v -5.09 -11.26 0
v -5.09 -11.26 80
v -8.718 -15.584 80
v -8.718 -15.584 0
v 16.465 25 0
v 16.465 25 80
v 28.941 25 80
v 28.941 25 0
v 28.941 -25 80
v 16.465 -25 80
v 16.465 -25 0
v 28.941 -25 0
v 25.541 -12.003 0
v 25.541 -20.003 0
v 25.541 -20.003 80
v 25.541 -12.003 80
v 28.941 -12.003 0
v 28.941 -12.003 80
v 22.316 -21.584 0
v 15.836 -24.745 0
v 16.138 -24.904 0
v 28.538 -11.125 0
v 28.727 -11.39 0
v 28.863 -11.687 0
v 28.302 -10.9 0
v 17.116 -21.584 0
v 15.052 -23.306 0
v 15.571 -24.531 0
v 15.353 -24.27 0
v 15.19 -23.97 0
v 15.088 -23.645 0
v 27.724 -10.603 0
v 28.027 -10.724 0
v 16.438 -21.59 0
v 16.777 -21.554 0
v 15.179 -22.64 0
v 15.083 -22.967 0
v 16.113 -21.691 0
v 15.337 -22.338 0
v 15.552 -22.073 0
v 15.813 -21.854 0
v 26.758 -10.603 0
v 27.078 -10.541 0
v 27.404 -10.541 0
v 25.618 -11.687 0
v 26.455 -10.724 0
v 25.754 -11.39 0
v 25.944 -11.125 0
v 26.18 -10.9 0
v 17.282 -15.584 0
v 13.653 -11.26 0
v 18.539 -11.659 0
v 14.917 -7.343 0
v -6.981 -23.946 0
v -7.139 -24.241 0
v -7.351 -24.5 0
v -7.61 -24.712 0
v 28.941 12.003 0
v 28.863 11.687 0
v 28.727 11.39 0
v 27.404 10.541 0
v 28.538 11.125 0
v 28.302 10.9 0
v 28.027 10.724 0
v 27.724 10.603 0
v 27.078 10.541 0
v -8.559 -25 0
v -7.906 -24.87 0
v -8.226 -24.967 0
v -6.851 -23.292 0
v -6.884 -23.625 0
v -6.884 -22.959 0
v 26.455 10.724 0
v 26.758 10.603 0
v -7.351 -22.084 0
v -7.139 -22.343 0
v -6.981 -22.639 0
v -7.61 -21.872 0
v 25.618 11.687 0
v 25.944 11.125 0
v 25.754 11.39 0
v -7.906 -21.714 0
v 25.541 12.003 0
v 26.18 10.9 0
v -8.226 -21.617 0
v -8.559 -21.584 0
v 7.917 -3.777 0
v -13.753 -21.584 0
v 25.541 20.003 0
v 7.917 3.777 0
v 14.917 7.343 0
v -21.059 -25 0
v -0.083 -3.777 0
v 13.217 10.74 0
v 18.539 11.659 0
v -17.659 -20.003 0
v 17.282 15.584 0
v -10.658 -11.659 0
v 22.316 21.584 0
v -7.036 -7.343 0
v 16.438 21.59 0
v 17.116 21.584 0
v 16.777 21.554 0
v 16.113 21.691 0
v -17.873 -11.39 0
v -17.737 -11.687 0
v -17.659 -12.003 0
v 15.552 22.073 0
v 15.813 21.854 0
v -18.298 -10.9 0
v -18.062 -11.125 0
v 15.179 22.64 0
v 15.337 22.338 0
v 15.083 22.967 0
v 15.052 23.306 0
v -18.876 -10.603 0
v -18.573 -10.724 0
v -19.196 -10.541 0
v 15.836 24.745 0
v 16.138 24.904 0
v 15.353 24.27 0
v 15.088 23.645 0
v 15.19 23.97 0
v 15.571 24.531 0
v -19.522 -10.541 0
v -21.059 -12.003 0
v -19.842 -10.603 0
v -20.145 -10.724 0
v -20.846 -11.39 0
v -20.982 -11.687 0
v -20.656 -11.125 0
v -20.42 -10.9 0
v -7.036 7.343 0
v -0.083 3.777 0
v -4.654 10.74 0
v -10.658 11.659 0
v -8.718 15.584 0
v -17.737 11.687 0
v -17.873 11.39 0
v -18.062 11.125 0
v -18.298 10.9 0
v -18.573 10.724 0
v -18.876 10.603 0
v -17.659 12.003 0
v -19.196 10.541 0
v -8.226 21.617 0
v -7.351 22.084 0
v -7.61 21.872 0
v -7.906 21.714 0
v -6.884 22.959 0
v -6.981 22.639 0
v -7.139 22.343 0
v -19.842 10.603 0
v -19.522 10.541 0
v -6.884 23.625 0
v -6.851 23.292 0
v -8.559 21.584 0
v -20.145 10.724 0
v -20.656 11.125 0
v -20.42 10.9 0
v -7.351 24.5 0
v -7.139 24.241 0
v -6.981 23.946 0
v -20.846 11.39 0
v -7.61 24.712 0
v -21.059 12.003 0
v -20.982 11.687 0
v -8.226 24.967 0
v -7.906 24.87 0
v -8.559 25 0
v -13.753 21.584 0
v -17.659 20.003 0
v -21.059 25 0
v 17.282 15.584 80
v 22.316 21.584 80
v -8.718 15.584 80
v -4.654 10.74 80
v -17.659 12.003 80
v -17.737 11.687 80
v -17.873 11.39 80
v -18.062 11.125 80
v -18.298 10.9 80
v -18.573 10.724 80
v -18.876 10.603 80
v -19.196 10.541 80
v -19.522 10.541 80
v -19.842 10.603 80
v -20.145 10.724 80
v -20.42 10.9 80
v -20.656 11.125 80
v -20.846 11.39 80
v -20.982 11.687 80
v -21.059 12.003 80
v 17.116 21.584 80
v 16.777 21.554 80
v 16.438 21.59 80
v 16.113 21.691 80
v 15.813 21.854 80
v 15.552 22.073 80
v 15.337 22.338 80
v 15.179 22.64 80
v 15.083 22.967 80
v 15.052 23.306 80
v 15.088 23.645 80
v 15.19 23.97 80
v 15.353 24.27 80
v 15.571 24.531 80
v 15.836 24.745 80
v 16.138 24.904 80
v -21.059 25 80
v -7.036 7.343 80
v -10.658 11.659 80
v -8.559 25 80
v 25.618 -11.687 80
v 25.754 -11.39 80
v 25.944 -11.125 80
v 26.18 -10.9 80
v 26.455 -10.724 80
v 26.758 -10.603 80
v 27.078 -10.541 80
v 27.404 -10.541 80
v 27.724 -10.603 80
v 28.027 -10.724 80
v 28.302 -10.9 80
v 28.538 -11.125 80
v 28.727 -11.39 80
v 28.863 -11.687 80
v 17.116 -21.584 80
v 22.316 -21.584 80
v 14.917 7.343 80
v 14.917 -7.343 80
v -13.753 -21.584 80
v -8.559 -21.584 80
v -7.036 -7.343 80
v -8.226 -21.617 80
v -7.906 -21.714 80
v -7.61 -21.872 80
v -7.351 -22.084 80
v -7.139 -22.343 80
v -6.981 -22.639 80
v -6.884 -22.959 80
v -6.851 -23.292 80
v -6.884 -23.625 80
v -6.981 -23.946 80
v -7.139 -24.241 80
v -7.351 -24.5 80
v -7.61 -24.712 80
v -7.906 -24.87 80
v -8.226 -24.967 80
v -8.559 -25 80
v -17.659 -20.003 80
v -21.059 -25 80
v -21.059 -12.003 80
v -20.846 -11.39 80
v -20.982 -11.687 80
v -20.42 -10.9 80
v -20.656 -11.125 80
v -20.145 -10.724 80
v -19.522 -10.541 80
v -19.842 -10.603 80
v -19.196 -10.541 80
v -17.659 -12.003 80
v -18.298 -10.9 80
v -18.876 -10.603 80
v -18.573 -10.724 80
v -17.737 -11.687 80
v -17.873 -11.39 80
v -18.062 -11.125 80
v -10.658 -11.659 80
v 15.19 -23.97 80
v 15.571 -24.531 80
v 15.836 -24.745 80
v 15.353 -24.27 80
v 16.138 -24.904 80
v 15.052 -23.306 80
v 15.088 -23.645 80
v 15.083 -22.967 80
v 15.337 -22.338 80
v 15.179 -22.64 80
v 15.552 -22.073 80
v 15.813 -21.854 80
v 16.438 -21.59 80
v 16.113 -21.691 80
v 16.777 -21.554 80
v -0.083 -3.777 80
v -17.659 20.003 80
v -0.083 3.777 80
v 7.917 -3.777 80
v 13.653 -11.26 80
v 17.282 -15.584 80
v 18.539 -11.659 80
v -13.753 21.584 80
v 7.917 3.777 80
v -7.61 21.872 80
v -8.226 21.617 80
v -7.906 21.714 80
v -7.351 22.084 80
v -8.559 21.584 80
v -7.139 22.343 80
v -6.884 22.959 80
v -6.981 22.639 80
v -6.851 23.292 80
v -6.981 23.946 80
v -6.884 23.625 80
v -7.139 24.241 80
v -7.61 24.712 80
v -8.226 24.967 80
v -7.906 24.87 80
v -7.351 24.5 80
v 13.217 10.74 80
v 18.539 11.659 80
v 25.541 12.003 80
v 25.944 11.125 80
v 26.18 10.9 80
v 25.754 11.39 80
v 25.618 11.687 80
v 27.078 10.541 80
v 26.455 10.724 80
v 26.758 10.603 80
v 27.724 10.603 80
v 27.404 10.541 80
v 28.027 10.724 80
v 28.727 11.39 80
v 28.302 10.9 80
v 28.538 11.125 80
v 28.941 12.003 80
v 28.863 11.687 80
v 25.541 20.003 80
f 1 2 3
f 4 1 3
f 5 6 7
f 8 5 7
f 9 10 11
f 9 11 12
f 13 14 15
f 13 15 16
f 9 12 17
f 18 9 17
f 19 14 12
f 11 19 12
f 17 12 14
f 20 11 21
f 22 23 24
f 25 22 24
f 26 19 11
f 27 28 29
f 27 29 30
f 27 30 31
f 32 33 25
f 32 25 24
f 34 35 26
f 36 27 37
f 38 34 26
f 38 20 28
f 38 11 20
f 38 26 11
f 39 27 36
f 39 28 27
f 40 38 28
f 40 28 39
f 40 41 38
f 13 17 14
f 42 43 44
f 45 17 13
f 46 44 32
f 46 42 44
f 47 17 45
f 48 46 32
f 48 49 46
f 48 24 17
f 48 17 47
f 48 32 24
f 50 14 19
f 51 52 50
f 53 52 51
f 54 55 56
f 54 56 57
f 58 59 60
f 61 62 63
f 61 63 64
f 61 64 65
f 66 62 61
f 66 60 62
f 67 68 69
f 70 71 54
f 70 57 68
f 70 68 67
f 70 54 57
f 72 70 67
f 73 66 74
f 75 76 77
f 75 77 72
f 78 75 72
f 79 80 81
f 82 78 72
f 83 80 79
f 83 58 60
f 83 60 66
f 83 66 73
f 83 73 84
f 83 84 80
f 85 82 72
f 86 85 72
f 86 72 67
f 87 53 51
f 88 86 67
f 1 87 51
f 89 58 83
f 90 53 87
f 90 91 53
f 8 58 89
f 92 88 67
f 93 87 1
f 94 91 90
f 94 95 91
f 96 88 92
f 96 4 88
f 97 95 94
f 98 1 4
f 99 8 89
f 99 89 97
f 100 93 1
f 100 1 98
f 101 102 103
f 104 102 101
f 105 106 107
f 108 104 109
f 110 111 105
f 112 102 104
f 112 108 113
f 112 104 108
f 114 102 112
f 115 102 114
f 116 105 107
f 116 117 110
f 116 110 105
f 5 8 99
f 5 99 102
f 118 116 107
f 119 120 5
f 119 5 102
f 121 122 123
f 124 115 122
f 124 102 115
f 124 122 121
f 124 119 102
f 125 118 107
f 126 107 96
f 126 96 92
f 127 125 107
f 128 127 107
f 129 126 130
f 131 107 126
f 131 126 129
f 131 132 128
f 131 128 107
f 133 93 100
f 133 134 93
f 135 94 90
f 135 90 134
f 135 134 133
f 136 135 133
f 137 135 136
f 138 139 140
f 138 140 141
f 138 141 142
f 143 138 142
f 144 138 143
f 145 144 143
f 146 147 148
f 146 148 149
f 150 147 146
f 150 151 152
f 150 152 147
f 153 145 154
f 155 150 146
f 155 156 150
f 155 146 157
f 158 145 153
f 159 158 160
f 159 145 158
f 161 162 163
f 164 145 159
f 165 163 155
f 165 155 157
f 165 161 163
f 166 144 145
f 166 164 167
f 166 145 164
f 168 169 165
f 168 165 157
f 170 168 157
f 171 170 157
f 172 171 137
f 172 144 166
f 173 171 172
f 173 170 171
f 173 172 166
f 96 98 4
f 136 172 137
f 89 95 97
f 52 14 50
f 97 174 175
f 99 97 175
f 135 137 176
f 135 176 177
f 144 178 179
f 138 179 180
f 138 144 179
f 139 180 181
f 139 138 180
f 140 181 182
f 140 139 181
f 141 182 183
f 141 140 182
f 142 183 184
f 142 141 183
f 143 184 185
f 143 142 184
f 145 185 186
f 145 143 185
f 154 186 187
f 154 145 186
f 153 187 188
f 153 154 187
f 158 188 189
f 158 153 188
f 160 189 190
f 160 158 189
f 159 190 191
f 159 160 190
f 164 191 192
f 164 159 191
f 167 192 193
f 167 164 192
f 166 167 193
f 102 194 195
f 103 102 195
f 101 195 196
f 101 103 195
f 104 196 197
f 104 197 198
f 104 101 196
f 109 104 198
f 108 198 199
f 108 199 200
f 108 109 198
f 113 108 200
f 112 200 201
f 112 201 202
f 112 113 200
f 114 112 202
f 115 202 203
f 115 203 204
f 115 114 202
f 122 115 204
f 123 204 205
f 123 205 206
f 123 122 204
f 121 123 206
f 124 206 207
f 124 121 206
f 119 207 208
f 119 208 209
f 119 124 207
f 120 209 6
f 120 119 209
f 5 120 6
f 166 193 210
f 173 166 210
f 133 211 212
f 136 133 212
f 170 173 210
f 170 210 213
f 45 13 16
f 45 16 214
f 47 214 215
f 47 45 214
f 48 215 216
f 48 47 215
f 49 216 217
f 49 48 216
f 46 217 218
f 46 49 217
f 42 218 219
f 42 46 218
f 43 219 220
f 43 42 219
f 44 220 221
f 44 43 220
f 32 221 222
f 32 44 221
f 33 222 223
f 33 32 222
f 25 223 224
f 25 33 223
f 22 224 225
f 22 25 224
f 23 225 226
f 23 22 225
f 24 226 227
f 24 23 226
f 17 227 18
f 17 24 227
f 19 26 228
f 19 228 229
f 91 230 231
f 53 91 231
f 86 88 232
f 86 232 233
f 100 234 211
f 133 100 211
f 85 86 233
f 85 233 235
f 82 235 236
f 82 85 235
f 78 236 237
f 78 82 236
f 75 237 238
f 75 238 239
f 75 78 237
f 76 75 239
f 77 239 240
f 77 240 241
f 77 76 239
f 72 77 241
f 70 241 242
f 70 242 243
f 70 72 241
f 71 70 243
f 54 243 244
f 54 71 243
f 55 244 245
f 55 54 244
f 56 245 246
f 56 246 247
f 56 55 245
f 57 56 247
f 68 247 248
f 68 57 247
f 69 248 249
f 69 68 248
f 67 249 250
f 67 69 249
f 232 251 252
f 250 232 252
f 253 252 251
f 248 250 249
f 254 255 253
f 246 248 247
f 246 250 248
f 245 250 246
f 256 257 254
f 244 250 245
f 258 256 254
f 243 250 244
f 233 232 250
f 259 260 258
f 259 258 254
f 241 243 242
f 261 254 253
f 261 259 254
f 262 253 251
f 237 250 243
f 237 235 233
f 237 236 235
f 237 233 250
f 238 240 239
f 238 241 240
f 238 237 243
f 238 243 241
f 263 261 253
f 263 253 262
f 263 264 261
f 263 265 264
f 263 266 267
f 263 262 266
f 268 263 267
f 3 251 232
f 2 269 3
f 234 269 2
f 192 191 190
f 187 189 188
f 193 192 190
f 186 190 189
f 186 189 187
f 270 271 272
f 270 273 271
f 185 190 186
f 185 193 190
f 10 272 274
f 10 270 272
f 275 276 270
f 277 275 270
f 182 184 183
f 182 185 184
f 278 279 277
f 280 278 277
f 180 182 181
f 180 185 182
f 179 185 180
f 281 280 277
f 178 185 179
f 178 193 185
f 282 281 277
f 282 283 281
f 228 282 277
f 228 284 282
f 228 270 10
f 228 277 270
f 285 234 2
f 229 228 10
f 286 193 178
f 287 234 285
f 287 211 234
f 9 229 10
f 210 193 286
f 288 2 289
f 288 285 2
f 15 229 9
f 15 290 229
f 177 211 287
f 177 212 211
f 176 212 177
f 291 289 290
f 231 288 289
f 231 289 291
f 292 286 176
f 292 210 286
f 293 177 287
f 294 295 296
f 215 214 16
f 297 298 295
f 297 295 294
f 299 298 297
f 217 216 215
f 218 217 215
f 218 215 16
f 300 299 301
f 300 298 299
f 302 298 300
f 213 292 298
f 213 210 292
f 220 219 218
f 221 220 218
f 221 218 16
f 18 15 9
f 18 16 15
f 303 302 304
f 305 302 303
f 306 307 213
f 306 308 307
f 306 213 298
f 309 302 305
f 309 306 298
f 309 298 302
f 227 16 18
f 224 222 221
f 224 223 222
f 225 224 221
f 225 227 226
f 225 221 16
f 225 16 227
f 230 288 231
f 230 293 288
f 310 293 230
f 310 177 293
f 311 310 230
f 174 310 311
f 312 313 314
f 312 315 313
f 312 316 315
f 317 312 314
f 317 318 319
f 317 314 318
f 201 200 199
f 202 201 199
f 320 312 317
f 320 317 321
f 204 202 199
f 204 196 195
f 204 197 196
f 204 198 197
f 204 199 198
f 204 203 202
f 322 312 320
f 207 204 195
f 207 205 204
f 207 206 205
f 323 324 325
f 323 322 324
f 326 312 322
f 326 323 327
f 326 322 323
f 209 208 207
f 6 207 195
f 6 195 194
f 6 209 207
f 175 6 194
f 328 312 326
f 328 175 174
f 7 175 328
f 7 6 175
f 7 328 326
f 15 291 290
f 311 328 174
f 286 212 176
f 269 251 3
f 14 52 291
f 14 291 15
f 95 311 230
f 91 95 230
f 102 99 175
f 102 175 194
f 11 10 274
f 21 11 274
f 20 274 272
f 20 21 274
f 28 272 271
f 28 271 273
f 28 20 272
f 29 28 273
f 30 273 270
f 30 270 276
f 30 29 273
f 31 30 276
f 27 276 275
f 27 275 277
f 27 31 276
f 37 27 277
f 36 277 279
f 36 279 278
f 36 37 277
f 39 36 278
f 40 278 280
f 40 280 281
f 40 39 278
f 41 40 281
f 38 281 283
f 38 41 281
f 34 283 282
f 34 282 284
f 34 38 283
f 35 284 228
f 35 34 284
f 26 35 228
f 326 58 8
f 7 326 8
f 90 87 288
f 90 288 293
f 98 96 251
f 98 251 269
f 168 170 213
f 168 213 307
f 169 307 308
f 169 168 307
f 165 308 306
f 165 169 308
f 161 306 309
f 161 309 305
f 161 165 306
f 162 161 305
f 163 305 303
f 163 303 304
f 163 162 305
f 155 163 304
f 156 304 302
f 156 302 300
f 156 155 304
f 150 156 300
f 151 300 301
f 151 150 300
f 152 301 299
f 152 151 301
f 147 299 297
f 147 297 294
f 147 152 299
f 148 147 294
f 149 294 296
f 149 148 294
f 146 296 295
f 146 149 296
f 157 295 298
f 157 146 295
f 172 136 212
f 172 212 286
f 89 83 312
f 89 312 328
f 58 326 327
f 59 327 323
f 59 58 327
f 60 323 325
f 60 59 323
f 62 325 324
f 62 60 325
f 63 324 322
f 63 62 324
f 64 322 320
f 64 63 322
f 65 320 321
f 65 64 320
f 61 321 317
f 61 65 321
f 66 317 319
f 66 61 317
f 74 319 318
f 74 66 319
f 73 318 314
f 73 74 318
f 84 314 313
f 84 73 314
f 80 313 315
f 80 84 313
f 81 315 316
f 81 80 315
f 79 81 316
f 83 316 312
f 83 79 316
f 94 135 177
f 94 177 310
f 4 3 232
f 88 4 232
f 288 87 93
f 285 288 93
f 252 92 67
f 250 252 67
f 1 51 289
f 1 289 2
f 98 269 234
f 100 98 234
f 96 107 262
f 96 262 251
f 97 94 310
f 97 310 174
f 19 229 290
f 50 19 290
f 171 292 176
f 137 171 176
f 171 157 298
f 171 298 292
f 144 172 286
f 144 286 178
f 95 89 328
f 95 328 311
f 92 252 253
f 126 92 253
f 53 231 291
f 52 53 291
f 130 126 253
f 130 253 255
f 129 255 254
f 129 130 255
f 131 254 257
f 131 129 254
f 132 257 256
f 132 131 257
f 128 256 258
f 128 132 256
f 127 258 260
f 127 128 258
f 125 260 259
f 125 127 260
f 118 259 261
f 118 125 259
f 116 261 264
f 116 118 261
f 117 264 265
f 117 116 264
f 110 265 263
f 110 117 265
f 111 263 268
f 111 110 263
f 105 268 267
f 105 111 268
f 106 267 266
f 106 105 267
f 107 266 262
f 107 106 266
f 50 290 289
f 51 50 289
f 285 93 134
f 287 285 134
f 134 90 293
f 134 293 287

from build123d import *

# Parameters (mm, degrees)
SKETCH1_W           = 50
SKETCH1_H           = 50
BOSS_EXTRUDE1_DEPTH = 80
SKETCH2_W           = 18
SKETCH2_H           = 18
CUT_EXTRUDE2_DEPTH  = 287
SKETCH3_OUTSIDE_W   = 73.354
SKETCH3_OUTSIDE_H   = 73.354
CUT_EXTRUDE5_DEPTH  = 287
SKETCH4_W           = 18
SKETCH4_H           = 18
BOSS_EXTRUDE2_DEPTH = 80
SKETCH5_W           = 8
SKETCH5_H           = 7.553245746
CUT_EXTRUDE6_DEPTH  = 250


with BuildPart() as part:
    # Sketch1 → Boss-Extrude1 (new body)
    with BuildSketch(Plane.XY):
        with Locations((3.9408867, 0)):
            Rectangle(SKETCH1_W, SKETCH1_H)
    extrude(amount=BOSS_EXTRUDE1_DEPTH)

    # Sketch2 → Cut-Extrude2 (cut)
    with BuildSketch(Plane(origin=(0, 0, 0), x_dir=(-1, 0, 0), z_dir=(0, 0, -1))):
        with Locations((-3.9408867, 0)):
            Rectangle(SKETCH2_W, SKETCH2_H)
    extrude(amount=-CUT_EXTRUDE2_DEPTH, mode=Mode.SUBTRACT)

    # Sketch3 outside → Cut-Extrude5 (cut)
    with BuildSketch(Plane(origin=(0, 0, 0), x_dir=(-1, 0, 0), z_dir=(0, 0, -1))):
        with Locations((-3.941, 0)):
            Rectangle(SKETCH3_OUTSIDE_W, SKETCH3_OUTSIDE_H)
        with BuildLine():
            Line((-22.316271067, 21.584230763), (-17.116271067, 21.584230763))
            ThreePointArc((-17.116271067, 21.584230763), (-15.082817857, 22.96654679), (-16.465133883, 25))
            Line((-16.465133883, 25), (-28.9408867, 25))
            Line((-28.9408867, 25), (-28.9408867, 12.5))
            ThreePointArc((-28.9408867, 12.5), (-27.489165976, 10.551720724), (-25.5408867, 12.003441448))
            Line((-25.5408867, 12.003441448), (-25.5408867, 20.003441448))
            Line((-25.5408867, 20.003441448), (-18.539469589, 11.659477453))
            Line((-18.539469589, 11.659477453), (-14.917465737, 7.34294135))
            Line((-14.917465737, 7.34294135), (-14.917465737, -7.34294135))
            Line((-14.917465737, -7.34294135), (-18.539469589, -11.659477453))
            Line((-18.539469589, -11.659477453), (-25.5408867, -20.003441448))
            Line((-25.5408867, -20.003441448), (-25.5408867, -12.003441448))
            ThreePointArc((-25.5408867, -12.003441448), (-27.489165976, -10.551720724), (-28.9408867, -12.5))
            Line((-28.9408867, -12.5), (-28.9408867, -25))
            Line((-28.9408867, -25), (-16.465133883, -25))
            ThreePointArc((-16.465133883, -25), (-15.082817857, -22.96654679), (-17.116271067, -21.584230763))
            Line((-17.116271067, -21.584230763), (-22.316271067, -21.584230763))
            Line((-22.316271067, -21.584230763), (-17.28167328, -15.584230763))
            Line((-17.28167328, -15.584230763), (-13.653142176, -11.259915785))
            Line((-13.653142176, -11.259915785), (5.089795616, -11.259915785))
            Line((5.089795616, -11.259915785), (8.71832672, -15.584230763))
            Line((8.71832672, -15.584230763), (13.752924507, -21.584230763))
            Line((13.752924507, -21.584230763), (8.5591133, -21.584230763))
            ThreePointArc((8.5591133, -21.584230763), (6.851228682, -23.292115382), (8.5591133, -25))
            Line((8.5591133, -25), (21.0591133, -25))
            Line((21.0591133, -25), (21.0591133, -12.5))
            ThreePointArc((21.0591133, -12.5), (19.607392577, -10.551720724), (17.6591133, -12.003441448))
            Line((17.6591133, -12.003441448), (17.6591133, -20.003441448))
            Line((17.6591133, -20.003441448), (10.65769619, -11.659477453))
            Line((10.65769619, -11.659477453), (7.035692338, -7.34294135))
            Line((7.035692338, -7.34294135), (7.035692338, 7.34294135))
            Line((7.035692338, 7.34294135), (10.65769619, 11.659477453))
            Line((10.65769619, 11.659477453), (17.6591133, 20.003441448))
            Line((17.6591133, 20.003441448), (17.6591133, 12.003441448))
            ThreePointArc((17.6591133, 12.003441448), (19.607392577, 10.551720724), (21.0591133, 12.5))
            Line((21.0591133, 12.5), (21.0591133, 25))
            Line((21.0591133, 25), (8.5591133, 25))
            ThreePointArc((8.5591133, 25), (6.851228682, 23.292115382), (8.5591133, 21.584230763))
            Line((8.5591133, 21.584230763), (13.752924507, 21.584230763))
            Line((13.752924507, 21.584230763), (8.71832672, 15.584230763))
            Line((8.71832672, 15.584230763), (4.653605138, 10.740084215))
            Line((4.653605138, 10.740084215), (-13.216951698, 10.740084215))
            Line((-13.216951698, 10.740084215), (-17.28167328, 15.584230763))
            Line((-17.28167328, 15.584230763), (-22.316271067, 21.584230763))
        make_face(mode=Mode.SUBTRACT)
    extrude(amount=-CUT_EXTRUDE5_DEPTH, mode=Mode.SUBTRACT)

    # Sketch4 → Boss-Extrude2 (add)
    with BuildSketch(Plane(origin=(0, 0, 0), x_dir=(-1, 0, 0), z_dir=(0, 0, -1))):
        with Locations((-3.9408867, 0)):
            Rectangle(SKETCH4_W, SKETCH4_H)
    extrude(amount=-BOSS_EXTRUDE2_DEPTH)

    # Sketch5 → Cut-Extrude6 (cut)
    with BuildSketch(Plane(origin=(0, 0, 0), x_dir=(-1, 0, 0), z_dir=(0, 0, -1))):
        with Locations((-3.917465737, 0)):
            Rectangle(SKETCH5_W, SKETCH5_H)
    extrude(amount=-CUT_EXTRUDE6_DEPTH, mode=Mode.SUBTRACT)


solid = part.part
